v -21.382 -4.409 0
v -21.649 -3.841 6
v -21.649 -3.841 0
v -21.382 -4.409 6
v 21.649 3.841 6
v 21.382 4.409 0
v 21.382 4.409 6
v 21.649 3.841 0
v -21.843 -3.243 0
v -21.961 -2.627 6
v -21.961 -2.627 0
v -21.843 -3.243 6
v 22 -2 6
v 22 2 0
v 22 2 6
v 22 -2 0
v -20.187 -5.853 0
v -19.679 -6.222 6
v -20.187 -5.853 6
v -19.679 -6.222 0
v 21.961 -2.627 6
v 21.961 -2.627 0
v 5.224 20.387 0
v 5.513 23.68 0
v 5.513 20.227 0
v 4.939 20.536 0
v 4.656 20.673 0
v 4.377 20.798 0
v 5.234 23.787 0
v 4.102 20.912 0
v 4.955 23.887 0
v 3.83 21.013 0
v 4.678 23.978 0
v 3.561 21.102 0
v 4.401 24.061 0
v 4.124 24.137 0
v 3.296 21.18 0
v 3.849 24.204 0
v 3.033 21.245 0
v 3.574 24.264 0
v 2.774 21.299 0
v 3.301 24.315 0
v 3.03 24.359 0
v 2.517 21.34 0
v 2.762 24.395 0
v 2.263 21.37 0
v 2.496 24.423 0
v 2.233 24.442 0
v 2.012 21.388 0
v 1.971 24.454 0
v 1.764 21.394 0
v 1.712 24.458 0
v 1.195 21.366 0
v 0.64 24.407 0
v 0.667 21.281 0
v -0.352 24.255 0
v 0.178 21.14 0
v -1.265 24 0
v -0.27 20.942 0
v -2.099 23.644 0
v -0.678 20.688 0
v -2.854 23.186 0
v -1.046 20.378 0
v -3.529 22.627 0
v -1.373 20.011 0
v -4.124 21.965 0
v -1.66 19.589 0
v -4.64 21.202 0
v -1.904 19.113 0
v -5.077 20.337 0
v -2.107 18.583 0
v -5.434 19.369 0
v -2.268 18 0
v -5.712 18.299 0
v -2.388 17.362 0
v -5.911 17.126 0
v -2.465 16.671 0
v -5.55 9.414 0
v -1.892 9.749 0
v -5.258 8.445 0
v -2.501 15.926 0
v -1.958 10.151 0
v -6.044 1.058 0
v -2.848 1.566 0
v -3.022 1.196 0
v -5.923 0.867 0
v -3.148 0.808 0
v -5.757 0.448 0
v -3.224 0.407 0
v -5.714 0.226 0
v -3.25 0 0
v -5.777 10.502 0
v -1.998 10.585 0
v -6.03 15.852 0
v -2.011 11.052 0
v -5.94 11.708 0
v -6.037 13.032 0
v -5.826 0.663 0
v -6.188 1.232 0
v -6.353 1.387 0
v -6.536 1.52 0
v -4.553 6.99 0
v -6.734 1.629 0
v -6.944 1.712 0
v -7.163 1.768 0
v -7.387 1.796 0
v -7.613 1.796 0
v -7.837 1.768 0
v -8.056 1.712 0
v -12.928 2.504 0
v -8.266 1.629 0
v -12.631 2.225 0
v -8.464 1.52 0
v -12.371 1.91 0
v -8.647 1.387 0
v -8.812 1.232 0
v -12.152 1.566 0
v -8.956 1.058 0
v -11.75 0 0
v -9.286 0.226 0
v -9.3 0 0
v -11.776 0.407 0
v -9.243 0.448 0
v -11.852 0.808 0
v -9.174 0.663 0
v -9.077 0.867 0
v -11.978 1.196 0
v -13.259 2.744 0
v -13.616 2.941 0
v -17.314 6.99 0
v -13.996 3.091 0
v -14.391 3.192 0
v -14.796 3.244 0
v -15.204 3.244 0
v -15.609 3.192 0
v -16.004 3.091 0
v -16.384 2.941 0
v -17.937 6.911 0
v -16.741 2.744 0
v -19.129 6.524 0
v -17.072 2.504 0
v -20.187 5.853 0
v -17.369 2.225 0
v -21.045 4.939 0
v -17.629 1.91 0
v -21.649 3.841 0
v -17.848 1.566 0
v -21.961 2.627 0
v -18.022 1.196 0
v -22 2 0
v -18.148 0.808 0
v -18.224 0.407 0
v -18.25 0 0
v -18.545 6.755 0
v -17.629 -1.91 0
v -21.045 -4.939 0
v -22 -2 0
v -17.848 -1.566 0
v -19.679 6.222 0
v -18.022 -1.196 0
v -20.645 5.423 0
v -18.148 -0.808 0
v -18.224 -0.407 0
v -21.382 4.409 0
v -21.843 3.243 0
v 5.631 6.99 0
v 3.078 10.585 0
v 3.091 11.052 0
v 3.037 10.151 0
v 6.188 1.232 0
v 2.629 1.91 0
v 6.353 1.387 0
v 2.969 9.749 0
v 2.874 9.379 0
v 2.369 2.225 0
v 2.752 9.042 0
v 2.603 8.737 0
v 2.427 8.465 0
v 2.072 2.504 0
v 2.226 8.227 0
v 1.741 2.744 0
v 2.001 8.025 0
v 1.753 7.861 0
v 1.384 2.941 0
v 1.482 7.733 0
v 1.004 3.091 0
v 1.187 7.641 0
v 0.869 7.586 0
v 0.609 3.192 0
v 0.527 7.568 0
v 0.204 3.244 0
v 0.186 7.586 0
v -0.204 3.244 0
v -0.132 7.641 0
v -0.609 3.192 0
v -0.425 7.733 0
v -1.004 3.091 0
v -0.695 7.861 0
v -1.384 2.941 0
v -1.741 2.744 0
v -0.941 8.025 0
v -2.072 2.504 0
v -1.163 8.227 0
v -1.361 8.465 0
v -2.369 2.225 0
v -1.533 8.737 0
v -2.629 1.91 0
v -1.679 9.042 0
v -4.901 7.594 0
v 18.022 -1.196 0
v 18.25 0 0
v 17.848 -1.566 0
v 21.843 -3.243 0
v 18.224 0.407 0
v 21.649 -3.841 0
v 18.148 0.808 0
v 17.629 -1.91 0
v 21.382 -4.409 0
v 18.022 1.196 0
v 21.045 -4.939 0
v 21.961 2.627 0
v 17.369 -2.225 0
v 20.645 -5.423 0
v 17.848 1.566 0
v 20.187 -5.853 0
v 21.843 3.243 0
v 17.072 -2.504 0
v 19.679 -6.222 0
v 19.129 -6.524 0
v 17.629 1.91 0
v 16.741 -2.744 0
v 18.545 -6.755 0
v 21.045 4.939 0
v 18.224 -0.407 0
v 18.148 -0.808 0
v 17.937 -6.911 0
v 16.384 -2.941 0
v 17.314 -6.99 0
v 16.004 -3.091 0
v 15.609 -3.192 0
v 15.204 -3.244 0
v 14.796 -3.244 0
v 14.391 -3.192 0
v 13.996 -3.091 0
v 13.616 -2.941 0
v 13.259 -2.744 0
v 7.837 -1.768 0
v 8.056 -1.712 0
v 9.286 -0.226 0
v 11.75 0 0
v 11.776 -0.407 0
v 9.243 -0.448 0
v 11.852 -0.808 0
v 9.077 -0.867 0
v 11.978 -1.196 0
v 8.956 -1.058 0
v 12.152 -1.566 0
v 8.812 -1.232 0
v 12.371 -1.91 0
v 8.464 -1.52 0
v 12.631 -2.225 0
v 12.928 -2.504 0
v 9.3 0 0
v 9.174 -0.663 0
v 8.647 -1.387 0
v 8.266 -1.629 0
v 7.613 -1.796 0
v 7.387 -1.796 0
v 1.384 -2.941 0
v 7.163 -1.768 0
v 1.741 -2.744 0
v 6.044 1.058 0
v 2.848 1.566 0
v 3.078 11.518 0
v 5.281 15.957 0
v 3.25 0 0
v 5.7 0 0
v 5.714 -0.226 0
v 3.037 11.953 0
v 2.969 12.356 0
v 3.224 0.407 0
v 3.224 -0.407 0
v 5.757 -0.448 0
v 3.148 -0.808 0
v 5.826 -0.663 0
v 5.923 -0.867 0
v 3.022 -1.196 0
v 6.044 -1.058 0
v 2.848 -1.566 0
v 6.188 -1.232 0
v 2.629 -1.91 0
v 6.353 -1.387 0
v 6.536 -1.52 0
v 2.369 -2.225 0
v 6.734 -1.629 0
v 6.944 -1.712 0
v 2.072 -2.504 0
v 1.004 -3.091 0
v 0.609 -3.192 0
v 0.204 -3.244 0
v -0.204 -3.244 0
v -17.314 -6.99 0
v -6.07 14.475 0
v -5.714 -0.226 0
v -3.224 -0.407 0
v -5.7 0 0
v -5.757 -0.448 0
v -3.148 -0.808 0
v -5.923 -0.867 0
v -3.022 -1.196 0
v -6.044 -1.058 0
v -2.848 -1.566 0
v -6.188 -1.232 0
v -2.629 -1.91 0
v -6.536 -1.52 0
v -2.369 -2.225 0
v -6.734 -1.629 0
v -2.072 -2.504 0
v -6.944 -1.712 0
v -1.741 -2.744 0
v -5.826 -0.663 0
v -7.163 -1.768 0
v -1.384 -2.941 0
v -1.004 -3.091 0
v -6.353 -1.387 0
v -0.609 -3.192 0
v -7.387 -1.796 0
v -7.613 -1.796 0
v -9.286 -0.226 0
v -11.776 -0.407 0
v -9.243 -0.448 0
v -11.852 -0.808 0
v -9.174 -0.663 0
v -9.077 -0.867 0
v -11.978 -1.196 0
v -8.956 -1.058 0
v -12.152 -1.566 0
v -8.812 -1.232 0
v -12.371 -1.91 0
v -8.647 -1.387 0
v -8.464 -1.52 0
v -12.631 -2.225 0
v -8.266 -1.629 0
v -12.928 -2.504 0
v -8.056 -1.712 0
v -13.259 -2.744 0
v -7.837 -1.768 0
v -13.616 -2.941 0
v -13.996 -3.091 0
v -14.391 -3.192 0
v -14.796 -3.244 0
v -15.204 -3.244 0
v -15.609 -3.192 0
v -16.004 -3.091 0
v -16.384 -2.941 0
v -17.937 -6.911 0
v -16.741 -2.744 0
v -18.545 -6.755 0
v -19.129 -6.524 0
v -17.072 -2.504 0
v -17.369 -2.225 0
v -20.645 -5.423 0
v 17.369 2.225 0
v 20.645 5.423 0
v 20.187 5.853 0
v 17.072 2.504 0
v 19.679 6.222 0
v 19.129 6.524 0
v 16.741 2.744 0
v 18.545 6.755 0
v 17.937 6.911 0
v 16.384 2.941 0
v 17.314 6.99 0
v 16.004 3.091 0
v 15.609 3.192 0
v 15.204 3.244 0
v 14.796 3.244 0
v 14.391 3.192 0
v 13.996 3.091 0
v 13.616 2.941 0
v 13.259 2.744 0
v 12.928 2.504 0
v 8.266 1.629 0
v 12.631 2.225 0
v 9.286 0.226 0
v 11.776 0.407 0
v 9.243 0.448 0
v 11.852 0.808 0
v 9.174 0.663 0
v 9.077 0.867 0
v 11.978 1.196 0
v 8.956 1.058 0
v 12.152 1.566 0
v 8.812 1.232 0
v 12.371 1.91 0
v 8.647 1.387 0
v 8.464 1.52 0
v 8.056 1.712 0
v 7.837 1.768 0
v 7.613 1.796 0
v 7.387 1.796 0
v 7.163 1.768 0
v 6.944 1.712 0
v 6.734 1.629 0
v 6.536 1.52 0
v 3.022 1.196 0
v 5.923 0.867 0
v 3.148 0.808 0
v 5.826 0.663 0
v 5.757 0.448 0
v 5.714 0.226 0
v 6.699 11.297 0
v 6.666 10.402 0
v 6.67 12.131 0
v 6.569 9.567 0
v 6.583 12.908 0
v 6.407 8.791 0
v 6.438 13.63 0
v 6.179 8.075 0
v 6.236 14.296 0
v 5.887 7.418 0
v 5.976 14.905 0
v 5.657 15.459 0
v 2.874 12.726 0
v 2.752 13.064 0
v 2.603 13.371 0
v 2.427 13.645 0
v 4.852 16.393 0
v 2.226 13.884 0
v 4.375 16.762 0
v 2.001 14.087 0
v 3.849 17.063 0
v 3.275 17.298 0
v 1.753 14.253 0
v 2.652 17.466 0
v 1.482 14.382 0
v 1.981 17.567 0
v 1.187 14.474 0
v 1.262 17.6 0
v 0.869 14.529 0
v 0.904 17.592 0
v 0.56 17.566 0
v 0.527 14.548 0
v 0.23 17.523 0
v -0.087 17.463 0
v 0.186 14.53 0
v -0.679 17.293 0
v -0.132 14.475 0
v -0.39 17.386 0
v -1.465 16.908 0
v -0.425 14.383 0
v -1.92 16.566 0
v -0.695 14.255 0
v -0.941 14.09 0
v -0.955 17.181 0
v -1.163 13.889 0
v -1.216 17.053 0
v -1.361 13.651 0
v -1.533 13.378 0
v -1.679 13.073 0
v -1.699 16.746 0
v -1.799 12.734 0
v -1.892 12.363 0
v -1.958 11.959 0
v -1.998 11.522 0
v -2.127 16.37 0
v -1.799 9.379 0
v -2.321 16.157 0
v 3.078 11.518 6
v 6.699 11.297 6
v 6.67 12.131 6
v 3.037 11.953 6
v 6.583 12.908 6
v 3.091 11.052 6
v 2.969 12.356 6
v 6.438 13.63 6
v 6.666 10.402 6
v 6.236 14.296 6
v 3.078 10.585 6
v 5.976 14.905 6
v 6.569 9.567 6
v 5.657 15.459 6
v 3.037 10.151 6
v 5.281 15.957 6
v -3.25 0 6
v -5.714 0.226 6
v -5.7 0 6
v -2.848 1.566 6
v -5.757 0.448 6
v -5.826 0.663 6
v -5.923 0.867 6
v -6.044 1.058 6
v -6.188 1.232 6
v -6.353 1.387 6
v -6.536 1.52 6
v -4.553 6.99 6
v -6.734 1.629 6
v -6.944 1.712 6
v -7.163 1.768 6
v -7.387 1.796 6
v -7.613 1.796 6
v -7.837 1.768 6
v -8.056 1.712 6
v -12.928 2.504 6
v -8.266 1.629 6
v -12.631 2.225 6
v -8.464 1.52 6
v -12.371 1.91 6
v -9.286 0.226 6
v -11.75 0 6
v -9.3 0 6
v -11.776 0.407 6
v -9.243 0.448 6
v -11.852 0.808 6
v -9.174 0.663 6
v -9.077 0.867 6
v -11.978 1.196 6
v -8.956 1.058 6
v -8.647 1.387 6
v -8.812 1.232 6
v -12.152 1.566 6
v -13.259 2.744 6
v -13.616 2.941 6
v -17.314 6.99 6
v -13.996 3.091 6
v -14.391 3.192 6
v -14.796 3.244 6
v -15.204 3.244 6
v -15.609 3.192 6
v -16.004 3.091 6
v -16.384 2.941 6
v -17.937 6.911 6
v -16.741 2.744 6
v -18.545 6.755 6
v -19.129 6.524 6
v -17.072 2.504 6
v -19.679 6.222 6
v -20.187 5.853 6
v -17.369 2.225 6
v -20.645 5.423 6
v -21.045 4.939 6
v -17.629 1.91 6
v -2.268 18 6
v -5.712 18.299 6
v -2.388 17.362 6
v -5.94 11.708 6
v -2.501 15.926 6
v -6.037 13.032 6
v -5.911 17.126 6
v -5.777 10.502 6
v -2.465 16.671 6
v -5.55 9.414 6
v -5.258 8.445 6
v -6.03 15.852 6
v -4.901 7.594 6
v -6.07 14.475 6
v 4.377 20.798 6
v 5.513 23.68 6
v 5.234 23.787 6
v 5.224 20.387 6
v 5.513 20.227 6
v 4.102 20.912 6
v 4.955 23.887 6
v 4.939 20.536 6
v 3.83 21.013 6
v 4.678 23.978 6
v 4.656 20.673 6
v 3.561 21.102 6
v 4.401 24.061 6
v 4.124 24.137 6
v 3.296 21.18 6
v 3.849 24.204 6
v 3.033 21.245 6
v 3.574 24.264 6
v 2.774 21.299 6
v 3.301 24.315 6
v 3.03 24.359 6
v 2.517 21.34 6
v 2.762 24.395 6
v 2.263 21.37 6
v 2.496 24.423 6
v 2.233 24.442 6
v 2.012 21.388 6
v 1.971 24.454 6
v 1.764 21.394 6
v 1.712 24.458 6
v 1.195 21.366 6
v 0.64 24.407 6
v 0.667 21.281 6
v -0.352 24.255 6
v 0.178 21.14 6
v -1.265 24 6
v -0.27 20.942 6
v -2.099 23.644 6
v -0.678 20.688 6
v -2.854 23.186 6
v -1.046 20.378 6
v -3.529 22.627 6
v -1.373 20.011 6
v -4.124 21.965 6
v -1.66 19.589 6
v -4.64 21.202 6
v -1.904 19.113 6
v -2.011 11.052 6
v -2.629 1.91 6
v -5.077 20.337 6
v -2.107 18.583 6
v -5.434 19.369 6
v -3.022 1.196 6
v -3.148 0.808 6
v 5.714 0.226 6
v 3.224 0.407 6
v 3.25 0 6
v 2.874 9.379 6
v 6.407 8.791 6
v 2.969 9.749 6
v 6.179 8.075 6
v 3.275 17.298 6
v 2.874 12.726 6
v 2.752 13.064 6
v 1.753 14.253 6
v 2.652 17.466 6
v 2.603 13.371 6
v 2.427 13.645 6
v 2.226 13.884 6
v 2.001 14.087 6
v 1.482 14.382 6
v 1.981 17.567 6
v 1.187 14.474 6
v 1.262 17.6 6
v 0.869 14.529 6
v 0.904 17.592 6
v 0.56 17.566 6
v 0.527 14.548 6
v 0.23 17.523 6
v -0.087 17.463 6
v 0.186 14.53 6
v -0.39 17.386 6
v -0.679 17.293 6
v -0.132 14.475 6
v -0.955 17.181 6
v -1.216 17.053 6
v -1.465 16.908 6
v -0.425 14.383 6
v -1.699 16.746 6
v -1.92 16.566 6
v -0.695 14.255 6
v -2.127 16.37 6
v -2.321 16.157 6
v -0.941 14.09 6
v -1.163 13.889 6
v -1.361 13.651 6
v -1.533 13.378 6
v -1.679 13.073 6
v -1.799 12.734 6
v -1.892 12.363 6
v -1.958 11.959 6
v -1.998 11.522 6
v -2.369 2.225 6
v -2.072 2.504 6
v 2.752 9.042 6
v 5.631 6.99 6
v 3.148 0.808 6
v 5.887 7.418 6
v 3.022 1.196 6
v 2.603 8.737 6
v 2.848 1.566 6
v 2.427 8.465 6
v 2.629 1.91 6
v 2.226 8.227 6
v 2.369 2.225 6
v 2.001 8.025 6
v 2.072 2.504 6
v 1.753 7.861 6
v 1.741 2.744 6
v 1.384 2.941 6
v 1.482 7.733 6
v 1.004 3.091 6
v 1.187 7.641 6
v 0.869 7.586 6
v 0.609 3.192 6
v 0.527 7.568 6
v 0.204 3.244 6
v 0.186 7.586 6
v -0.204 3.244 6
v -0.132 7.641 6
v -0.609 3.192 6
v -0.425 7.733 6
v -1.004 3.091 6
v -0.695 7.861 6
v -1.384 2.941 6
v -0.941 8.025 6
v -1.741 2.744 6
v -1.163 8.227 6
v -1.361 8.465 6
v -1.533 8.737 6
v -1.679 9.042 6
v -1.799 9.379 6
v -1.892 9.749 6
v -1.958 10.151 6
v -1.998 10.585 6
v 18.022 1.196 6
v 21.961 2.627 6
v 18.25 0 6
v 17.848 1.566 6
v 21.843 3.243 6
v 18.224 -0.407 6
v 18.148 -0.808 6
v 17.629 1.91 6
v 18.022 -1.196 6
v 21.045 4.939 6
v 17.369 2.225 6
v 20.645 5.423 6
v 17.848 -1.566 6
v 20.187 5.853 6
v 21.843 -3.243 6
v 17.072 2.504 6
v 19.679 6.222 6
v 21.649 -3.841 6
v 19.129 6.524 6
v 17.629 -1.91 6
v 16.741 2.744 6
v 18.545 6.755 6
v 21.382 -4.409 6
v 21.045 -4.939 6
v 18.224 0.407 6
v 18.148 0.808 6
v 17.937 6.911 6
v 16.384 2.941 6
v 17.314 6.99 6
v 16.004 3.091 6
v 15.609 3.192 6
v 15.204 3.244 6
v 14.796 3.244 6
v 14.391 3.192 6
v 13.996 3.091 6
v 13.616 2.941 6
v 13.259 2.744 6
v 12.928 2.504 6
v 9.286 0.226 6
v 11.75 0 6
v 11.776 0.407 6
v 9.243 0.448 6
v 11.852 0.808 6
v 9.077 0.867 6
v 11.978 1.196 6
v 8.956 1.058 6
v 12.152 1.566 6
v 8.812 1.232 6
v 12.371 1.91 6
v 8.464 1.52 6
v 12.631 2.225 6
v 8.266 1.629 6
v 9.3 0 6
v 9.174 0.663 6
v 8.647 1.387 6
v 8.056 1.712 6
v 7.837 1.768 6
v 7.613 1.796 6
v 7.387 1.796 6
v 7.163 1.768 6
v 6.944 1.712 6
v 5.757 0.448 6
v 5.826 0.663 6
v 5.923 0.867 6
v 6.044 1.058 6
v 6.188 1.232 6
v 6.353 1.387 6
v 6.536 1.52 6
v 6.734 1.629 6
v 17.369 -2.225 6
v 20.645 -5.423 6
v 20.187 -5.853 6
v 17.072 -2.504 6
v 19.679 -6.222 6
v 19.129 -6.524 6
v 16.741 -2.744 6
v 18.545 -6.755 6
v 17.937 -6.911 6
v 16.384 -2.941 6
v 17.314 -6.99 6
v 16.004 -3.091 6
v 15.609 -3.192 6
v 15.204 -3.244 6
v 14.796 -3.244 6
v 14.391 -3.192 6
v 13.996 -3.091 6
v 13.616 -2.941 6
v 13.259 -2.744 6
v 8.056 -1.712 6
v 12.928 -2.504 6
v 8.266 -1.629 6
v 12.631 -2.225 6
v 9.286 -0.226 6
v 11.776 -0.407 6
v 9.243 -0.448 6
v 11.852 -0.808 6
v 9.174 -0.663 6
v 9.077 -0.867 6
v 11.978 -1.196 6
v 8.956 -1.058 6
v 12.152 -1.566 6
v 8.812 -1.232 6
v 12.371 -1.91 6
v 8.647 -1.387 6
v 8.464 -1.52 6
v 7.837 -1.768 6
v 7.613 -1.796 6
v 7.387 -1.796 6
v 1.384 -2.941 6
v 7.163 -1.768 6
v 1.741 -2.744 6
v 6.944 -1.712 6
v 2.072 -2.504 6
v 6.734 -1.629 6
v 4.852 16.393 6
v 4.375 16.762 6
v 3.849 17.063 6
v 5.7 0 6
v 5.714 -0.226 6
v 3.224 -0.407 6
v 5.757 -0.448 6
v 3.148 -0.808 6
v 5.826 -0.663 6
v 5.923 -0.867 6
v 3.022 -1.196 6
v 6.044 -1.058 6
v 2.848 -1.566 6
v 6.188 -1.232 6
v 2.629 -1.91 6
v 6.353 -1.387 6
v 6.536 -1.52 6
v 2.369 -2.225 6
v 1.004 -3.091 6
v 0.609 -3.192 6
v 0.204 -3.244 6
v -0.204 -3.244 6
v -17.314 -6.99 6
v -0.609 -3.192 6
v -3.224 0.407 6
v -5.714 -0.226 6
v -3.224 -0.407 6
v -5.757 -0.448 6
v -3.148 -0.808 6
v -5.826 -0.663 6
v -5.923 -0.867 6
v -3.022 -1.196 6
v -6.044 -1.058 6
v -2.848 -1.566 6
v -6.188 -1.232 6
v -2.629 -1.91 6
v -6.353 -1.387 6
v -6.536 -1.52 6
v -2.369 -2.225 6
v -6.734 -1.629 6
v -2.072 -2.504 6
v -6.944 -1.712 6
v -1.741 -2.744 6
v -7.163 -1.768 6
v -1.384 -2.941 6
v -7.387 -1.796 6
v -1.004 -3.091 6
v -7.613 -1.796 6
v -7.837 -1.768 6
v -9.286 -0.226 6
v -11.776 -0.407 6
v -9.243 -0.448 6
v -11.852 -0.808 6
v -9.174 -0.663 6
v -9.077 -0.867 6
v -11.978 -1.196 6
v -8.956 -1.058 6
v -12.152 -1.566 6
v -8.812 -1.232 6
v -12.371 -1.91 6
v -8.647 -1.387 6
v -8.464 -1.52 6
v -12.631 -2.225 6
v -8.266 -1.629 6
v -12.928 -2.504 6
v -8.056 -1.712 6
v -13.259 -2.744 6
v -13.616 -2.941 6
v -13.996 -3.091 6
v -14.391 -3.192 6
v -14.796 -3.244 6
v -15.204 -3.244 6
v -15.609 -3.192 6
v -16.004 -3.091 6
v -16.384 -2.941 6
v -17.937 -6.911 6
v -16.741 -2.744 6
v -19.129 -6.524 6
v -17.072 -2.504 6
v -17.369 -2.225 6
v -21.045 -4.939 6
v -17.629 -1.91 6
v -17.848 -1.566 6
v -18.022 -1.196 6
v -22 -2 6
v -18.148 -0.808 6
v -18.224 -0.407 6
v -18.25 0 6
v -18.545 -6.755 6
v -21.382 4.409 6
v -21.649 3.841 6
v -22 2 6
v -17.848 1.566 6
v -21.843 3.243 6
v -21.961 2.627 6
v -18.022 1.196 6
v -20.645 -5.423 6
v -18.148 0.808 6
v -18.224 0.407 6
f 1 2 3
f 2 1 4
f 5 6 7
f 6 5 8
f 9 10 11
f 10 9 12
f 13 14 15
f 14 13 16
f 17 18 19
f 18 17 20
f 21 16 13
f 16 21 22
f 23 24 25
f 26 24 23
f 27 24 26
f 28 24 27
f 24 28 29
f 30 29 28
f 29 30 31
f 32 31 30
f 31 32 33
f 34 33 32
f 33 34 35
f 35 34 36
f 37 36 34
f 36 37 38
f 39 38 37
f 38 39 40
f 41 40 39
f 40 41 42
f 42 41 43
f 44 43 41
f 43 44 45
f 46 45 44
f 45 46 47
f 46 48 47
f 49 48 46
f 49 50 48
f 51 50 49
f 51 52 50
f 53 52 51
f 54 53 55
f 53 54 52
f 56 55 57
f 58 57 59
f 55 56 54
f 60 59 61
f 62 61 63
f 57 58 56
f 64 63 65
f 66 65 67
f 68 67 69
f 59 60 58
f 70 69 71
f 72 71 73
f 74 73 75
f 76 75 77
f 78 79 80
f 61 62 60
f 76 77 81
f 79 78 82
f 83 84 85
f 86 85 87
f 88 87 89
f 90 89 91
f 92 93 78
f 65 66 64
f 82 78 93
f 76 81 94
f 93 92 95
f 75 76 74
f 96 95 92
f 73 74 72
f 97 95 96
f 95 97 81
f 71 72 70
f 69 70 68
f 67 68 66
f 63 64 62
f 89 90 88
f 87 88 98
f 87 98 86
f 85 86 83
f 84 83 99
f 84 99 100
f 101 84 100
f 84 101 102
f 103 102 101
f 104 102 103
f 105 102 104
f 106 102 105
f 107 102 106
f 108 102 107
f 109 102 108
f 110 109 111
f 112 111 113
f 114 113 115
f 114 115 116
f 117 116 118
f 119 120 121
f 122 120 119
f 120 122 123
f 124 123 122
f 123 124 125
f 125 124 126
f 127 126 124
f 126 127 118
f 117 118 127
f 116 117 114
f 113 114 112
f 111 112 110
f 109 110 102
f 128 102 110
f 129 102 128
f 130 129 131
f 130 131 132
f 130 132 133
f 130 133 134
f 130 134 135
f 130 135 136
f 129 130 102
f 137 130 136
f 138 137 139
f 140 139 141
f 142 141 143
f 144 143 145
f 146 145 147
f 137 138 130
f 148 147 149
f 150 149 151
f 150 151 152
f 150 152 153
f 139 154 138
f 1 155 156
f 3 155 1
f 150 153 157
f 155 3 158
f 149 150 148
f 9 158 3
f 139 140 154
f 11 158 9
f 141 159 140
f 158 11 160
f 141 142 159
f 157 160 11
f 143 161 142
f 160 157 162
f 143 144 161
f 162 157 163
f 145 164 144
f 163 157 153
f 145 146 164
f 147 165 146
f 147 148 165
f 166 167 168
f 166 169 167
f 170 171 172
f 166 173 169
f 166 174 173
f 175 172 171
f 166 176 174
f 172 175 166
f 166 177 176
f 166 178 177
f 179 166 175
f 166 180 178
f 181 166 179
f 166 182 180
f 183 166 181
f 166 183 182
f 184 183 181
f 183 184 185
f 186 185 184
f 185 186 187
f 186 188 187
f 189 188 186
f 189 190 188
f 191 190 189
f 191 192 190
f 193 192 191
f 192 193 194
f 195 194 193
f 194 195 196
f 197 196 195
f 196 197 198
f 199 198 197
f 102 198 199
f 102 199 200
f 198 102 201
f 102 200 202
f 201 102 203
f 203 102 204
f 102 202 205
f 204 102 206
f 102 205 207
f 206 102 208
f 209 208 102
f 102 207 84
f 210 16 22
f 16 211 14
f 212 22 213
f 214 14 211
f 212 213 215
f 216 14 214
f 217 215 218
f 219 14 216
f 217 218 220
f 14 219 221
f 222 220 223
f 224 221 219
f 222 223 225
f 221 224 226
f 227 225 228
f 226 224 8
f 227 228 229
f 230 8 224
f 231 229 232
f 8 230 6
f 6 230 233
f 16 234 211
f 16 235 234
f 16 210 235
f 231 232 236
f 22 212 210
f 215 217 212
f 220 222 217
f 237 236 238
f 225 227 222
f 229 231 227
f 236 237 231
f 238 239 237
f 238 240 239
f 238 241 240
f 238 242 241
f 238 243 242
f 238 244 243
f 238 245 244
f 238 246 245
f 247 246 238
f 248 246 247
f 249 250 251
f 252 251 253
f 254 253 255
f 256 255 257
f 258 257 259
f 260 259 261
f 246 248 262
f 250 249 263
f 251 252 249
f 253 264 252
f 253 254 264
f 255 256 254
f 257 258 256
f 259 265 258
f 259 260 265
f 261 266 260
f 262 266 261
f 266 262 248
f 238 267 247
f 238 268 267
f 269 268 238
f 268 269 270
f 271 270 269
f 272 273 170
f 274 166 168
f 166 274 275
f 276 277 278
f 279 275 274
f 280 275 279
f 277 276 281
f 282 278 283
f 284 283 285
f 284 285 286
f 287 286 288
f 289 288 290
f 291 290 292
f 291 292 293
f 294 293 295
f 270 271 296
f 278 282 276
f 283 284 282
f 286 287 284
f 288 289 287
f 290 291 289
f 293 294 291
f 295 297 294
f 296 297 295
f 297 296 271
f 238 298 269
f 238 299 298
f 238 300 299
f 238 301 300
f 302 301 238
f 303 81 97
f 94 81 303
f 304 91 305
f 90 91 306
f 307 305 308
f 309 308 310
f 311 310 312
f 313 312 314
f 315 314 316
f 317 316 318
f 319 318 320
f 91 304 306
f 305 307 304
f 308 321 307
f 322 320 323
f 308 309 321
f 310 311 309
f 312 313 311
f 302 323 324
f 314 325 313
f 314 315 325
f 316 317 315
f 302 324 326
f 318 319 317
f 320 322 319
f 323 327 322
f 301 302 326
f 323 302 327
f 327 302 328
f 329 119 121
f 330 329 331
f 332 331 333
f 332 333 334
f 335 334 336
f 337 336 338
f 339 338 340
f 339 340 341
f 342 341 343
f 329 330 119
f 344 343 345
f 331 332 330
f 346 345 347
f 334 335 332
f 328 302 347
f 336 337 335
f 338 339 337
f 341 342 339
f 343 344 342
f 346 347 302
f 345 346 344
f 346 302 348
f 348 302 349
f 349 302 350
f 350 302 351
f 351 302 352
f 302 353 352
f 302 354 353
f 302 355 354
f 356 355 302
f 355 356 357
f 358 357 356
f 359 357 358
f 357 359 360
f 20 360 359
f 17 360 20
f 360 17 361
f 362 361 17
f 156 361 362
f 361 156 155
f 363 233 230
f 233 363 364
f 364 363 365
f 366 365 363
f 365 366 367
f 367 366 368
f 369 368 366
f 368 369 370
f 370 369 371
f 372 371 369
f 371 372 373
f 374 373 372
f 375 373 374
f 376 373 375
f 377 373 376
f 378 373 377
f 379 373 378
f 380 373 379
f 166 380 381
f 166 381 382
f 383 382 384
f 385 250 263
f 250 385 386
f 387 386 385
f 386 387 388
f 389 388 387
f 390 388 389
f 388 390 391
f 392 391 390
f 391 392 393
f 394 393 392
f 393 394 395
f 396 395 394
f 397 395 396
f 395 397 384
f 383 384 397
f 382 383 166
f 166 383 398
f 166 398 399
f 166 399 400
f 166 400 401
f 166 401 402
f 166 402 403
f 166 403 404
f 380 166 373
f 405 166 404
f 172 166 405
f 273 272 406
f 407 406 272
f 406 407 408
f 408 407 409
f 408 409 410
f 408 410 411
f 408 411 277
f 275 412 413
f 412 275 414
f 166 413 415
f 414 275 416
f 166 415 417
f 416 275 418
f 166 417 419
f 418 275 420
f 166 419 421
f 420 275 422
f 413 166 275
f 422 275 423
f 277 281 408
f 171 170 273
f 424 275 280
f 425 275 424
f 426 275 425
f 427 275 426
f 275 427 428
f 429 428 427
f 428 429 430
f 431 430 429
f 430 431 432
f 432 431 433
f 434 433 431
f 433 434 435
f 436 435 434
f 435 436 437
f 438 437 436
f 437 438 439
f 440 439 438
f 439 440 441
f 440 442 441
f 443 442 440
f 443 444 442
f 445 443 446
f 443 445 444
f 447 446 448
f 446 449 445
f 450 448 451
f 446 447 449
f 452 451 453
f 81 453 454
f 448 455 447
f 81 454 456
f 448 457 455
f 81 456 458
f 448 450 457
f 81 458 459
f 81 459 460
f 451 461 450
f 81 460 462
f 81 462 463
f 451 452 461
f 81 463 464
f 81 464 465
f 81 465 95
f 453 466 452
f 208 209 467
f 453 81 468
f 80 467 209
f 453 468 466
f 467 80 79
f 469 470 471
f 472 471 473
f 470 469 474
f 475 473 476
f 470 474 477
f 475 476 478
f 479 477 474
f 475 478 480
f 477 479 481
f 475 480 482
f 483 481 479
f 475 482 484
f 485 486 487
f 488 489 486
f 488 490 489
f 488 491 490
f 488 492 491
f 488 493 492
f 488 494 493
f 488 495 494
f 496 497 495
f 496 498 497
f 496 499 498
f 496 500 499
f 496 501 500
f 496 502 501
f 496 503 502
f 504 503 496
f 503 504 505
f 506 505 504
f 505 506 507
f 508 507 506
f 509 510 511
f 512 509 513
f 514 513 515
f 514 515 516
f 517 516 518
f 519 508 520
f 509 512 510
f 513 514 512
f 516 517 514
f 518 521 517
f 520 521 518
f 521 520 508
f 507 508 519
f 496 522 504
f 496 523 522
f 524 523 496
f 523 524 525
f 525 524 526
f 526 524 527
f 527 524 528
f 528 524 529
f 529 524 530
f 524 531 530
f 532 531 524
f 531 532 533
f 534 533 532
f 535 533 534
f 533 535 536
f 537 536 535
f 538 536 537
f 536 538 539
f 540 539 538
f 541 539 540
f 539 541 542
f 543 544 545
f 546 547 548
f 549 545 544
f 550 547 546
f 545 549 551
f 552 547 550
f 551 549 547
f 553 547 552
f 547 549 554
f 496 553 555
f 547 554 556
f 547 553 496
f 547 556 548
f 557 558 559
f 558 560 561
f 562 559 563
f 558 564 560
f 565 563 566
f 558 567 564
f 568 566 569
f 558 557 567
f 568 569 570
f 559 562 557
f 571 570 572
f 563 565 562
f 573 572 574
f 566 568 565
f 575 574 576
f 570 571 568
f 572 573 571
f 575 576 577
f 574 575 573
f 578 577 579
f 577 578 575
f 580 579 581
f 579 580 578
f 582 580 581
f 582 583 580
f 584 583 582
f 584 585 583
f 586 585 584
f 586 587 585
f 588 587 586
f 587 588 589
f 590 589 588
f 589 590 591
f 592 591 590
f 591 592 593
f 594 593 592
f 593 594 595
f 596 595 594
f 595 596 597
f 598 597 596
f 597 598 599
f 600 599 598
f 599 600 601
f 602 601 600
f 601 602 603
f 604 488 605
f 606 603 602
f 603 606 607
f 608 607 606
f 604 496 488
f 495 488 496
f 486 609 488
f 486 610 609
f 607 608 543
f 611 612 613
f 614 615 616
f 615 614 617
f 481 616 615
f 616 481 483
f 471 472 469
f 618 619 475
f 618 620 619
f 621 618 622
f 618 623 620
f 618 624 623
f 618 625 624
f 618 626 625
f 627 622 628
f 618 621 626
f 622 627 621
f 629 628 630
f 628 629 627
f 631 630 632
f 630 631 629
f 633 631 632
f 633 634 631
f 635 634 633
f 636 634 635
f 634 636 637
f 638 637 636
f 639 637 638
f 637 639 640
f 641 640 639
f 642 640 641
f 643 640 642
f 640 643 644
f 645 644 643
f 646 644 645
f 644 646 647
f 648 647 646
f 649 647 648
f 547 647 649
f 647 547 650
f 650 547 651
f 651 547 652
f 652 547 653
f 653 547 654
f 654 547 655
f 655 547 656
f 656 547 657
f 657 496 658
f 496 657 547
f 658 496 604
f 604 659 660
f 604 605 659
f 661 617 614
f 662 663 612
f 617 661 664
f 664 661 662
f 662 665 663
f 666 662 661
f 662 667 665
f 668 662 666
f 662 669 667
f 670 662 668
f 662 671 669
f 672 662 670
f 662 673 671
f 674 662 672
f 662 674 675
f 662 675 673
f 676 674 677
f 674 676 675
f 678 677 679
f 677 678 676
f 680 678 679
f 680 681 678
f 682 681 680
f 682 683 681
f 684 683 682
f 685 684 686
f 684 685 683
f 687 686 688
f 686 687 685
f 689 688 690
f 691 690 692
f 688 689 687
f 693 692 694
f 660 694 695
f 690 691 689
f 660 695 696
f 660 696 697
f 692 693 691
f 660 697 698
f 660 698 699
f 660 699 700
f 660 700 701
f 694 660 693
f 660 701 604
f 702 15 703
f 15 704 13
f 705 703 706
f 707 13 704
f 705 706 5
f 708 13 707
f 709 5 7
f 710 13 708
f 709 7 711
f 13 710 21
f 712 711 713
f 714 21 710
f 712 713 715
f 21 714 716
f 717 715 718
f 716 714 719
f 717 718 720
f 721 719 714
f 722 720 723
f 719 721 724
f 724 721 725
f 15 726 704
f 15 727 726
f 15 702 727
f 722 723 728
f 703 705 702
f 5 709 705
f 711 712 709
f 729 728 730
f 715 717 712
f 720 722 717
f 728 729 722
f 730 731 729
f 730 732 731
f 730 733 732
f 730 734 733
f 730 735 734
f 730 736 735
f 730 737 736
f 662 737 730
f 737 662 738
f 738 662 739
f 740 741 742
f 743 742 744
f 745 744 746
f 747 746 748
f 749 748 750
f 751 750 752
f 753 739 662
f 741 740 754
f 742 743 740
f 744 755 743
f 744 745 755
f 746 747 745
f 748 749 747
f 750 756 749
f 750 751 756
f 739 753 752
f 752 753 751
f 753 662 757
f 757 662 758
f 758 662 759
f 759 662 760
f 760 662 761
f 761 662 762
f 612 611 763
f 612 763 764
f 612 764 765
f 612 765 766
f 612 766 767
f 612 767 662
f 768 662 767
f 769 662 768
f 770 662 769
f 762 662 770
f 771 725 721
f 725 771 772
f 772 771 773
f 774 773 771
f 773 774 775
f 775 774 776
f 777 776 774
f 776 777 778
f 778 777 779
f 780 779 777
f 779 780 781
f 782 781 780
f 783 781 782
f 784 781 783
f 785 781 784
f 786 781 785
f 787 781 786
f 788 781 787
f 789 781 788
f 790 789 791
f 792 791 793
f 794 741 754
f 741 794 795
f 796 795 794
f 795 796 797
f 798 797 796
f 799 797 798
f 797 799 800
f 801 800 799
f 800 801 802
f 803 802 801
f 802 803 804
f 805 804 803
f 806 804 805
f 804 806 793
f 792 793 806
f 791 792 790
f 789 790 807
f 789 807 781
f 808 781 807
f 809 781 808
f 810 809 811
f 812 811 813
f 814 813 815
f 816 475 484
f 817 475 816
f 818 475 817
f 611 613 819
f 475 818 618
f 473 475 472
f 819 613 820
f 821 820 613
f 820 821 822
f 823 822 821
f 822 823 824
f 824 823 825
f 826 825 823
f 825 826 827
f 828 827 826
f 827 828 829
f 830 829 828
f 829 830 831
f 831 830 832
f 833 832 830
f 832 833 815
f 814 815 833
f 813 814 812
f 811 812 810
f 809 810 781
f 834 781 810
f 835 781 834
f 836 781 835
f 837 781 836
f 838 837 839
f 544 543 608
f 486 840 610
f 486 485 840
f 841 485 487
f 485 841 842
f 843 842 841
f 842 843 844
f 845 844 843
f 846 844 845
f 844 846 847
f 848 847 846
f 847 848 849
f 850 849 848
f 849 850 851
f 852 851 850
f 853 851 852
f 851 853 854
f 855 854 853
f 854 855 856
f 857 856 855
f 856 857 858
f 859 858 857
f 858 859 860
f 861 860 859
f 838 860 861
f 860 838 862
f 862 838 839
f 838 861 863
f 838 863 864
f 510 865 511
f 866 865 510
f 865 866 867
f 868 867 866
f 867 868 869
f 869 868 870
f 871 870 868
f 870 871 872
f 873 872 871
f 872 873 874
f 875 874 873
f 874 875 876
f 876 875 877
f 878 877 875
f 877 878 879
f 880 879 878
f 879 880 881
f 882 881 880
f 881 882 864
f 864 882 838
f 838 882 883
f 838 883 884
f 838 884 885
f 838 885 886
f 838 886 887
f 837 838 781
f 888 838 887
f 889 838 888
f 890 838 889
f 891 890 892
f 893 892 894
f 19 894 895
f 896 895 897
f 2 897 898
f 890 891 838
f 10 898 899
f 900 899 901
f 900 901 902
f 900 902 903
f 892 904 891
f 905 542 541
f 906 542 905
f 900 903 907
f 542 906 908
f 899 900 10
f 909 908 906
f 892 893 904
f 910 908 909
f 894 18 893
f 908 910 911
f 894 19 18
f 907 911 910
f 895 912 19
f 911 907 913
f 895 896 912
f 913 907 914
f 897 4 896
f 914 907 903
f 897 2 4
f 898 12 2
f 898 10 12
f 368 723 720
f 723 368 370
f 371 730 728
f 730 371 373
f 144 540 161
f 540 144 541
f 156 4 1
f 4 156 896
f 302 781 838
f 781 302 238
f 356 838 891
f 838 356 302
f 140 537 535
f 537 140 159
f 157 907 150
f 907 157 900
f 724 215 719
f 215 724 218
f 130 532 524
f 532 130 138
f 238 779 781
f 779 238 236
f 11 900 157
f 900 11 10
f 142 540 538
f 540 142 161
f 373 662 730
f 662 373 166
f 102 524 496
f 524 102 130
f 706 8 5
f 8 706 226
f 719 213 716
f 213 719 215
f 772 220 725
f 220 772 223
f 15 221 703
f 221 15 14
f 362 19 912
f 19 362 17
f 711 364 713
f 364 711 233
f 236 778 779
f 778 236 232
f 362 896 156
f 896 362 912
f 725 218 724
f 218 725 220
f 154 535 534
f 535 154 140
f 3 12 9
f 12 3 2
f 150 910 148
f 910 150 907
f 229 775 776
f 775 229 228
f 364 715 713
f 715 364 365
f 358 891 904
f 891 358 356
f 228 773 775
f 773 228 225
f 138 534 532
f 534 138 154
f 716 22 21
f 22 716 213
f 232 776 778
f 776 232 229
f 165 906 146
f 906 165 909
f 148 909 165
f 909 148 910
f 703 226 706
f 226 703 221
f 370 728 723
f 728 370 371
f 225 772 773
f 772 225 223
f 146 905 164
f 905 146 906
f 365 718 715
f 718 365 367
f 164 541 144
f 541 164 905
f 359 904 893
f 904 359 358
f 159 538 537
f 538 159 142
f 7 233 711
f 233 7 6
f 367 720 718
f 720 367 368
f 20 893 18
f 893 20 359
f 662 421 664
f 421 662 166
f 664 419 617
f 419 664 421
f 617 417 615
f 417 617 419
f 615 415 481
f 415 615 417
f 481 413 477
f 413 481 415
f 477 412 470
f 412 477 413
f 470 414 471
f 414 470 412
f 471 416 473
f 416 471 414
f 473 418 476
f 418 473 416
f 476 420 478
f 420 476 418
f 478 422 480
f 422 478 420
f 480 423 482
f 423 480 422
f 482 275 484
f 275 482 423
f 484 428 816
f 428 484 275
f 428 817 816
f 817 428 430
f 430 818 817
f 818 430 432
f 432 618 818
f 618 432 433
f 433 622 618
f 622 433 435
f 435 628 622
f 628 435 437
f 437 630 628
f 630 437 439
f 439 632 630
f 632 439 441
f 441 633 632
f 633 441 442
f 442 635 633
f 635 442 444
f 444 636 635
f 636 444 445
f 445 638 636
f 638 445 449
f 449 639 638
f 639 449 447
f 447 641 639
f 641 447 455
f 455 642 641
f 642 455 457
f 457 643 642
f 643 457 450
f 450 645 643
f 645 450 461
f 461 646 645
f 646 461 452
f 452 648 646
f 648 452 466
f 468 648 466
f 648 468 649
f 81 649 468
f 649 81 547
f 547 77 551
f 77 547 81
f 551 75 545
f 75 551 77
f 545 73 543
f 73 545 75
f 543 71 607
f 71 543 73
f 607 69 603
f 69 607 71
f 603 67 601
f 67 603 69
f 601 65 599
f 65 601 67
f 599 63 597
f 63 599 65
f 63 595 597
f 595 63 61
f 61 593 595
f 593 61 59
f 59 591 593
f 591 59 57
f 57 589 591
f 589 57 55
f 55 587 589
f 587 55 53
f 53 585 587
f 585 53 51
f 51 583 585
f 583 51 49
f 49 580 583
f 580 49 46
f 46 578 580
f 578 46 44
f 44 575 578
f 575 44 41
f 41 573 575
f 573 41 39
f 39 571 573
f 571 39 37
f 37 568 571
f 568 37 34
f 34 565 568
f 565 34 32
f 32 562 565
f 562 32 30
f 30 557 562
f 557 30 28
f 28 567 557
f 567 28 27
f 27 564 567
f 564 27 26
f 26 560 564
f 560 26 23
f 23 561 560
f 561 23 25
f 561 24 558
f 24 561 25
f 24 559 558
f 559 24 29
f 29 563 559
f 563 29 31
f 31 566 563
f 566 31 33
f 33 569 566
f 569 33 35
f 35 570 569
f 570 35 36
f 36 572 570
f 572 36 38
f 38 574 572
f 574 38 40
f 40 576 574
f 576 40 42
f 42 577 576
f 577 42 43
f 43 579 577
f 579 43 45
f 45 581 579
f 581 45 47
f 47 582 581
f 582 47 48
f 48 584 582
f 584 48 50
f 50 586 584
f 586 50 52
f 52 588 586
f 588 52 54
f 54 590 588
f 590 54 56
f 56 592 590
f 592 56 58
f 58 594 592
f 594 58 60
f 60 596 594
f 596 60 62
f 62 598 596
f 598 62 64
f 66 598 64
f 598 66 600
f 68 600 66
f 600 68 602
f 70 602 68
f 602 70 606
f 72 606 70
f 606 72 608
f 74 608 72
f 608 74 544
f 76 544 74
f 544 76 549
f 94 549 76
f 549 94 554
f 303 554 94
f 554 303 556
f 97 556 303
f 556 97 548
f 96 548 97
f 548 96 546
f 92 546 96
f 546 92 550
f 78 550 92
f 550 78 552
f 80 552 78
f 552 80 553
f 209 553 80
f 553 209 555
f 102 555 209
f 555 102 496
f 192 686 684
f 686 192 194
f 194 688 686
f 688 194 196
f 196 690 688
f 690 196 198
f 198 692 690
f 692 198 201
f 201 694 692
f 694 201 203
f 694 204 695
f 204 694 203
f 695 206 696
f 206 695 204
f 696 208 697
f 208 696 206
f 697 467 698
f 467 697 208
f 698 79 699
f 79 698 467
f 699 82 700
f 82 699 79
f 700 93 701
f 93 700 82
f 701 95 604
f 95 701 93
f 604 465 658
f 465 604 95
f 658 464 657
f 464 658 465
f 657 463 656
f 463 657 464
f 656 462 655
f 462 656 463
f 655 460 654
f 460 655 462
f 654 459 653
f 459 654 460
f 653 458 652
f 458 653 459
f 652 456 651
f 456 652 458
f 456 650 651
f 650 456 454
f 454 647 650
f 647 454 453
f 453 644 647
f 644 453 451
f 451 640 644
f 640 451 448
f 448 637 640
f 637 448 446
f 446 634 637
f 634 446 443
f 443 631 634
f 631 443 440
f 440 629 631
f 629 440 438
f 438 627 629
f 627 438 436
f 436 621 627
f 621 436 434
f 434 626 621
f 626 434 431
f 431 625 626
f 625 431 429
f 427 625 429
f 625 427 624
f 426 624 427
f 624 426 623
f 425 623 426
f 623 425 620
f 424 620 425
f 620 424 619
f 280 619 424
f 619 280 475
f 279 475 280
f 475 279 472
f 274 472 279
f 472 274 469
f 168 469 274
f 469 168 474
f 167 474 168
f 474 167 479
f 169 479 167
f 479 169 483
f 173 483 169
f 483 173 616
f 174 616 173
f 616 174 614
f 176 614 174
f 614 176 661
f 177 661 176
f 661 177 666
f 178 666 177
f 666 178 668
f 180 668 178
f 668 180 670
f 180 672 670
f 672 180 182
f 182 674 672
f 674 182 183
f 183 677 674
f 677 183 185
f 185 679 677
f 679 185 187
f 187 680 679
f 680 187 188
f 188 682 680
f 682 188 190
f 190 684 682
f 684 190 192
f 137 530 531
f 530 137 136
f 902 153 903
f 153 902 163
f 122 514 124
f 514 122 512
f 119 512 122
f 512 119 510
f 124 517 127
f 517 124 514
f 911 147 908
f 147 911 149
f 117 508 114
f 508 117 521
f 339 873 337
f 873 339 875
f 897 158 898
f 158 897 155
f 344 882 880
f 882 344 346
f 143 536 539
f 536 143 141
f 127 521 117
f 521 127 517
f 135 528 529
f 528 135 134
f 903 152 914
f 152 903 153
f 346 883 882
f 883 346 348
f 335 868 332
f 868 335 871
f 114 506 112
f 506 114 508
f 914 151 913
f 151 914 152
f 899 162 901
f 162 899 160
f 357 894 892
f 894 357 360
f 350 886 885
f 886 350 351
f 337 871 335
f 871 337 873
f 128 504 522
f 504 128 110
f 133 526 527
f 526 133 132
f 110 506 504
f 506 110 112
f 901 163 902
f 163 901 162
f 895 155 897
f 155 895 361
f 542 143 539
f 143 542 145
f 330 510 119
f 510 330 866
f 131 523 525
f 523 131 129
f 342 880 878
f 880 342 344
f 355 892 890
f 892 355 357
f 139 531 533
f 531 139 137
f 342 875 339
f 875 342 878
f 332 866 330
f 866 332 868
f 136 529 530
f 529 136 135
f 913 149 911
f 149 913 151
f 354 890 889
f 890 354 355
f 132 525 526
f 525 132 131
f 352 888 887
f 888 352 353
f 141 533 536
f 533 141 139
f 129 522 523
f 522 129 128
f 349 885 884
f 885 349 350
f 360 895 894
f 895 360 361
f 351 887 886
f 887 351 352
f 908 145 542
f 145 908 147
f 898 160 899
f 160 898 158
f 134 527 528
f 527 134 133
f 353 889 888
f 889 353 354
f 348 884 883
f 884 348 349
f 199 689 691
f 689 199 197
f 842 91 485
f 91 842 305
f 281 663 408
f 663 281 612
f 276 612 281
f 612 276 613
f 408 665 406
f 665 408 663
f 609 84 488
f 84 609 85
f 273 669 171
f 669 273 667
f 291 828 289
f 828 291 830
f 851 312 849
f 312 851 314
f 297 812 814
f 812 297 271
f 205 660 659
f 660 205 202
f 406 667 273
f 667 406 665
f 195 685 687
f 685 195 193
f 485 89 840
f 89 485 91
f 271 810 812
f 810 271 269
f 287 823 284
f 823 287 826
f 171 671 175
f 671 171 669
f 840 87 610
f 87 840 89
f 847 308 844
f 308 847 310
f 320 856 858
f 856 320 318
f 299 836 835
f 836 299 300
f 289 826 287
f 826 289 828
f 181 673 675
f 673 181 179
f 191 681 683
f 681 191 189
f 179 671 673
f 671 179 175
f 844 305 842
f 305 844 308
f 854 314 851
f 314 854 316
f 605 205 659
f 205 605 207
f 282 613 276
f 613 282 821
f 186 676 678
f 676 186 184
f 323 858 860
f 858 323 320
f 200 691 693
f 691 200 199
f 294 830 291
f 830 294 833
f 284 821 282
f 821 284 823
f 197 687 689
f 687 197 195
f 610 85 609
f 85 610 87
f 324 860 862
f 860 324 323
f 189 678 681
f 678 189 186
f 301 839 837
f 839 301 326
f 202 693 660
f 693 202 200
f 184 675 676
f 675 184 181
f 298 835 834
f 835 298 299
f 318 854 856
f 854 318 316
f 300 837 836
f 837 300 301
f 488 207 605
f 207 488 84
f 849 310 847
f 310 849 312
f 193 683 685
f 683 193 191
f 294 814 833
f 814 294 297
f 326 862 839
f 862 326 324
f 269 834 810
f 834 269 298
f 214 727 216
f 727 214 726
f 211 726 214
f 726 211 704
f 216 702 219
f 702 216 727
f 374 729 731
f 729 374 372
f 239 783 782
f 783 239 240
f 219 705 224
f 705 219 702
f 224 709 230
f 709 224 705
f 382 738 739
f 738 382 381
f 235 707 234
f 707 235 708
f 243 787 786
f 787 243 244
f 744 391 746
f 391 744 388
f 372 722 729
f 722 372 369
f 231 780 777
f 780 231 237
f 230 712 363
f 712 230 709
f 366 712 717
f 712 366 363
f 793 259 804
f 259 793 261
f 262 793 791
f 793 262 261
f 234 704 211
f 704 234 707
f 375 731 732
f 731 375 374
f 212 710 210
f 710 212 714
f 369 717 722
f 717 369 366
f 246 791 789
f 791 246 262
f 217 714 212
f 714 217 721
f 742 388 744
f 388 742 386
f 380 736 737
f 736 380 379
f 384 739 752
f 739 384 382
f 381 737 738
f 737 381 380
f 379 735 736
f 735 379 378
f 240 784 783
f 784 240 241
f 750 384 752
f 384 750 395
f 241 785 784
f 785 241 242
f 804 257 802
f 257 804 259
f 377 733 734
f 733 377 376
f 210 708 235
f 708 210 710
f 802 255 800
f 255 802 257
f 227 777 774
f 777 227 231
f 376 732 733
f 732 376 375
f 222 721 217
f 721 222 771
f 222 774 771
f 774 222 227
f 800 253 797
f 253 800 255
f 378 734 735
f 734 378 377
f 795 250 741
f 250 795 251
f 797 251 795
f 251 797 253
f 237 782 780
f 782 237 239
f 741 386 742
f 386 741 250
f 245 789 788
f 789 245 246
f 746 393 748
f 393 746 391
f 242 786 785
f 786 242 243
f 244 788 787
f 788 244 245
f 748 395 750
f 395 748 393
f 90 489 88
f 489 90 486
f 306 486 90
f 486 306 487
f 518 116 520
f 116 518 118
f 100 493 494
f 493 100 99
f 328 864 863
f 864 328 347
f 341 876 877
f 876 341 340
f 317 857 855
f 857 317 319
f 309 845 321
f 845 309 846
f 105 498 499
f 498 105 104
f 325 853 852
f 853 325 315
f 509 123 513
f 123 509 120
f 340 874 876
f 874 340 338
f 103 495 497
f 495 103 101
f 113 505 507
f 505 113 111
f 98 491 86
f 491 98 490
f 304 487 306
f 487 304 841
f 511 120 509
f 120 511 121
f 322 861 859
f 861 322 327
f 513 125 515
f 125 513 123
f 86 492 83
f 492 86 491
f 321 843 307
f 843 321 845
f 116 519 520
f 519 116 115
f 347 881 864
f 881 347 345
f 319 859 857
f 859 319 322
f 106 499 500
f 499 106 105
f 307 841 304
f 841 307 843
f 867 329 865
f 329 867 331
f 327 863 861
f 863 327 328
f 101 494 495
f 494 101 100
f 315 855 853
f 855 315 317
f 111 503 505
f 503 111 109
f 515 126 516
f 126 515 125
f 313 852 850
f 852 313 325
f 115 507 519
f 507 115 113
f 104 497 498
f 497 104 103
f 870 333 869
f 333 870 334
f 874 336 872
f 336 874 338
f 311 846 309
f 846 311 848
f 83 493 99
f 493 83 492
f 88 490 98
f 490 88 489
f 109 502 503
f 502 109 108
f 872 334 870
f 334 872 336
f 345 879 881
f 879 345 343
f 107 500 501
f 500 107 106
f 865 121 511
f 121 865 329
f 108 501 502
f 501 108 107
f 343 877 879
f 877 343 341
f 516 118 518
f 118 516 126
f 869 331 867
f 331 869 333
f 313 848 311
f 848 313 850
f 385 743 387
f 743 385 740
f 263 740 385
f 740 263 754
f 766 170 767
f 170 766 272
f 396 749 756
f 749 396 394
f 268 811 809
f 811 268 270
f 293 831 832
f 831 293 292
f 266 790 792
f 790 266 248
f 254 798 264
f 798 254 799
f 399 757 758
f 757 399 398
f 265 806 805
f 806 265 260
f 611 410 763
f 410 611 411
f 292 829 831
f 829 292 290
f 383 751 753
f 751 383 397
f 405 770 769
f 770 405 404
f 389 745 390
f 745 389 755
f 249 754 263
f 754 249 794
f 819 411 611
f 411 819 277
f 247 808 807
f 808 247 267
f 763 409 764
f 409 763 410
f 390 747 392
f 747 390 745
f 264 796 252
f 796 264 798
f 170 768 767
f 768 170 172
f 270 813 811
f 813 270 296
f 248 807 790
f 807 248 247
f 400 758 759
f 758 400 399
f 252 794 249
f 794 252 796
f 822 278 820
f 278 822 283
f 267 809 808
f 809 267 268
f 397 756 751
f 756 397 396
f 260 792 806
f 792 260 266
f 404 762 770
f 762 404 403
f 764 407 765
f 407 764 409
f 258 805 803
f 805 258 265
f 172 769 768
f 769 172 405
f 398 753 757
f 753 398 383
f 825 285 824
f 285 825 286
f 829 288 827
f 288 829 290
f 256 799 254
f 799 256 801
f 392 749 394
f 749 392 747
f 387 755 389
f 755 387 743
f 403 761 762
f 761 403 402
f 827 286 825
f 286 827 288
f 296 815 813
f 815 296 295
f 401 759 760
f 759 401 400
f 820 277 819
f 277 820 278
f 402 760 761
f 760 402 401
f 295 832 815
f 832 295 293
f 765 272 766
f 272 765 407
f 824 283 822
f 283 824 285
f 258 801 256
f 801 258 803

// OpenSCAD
$fn = 50;


difference() {
	union() {
		hull() {
			translate(v = [-17.0000000000, 2.0000000000, 0]) {
				cylinder(h = 6, r = 5);
			}
			translate(v = [17.0000000000, 2.0000000000, 0]) {
				cylinder(h = 6, r = 5);
			}
			translate(v = [-17.0000000000, -2.0000000000, 0]) {
				cylinder(h = 6, r = 5);
			}
			translate(v = [17.0000000000, -2.0000000000, 0]) {
				cylinder(h = 6, r = 5);
			}
		}
		translate(v = [0, 24, 0]) {
			linear_extrude(height = 6) {
				text(font = "DejaVu Sans Mono:style=Bold", halign = "center", size = 19.0000000000, text = "6", valign = "top");
			}
		}
	}
	union() {
		translate(v = [-15.0000000000, 0.0000000000, 0]) {
			translate(v = [0, 0, -100]) {
				cylinder(h = 200, r = 3.2500000000);
			}
		}
		translate(v = [0, 0, -100]) {
			cylinder(h = 200, r = 3.2500000000);
		}
		translate(v = [15.0000000000, 0.0000000000, 0]) {
			translate(v = [0, 0, -100]) {
				cylinder(h = 200, r = 3.2500000000);
			}
		}
		translate(v = [-15.0000000000, 0.0000000000, 0]) {
			translate(v = [0, 0, -100]) {
				cylinder(h = 200, r = 1.8000000000);
			}
		}
		translate(v = [-7.5000000000, 0.0000000000, 0]) {
			translate(v = [0, 0, -100]) {
				cylinder(h = 200, r = 1.8000000000);
			}
		}
		translate(v = [0, 0, -100]) {
			cylinder(h = 200, r = 1.8000000000);
		}
		translate(v = [7.5000000000, 0.0000000000, 0]) {
			translate(v = [0, 0, -100]) {
				cylinder(h = 200, r = 1.8000000000);
			}
		}
		translate(v = [15.0000000000, 0.0000000000, 0]) {
			translate(v = [0, 0, -100]) {
				cylinder(h = 200, r = 1.8000000000);
			}
		}
	}
}
